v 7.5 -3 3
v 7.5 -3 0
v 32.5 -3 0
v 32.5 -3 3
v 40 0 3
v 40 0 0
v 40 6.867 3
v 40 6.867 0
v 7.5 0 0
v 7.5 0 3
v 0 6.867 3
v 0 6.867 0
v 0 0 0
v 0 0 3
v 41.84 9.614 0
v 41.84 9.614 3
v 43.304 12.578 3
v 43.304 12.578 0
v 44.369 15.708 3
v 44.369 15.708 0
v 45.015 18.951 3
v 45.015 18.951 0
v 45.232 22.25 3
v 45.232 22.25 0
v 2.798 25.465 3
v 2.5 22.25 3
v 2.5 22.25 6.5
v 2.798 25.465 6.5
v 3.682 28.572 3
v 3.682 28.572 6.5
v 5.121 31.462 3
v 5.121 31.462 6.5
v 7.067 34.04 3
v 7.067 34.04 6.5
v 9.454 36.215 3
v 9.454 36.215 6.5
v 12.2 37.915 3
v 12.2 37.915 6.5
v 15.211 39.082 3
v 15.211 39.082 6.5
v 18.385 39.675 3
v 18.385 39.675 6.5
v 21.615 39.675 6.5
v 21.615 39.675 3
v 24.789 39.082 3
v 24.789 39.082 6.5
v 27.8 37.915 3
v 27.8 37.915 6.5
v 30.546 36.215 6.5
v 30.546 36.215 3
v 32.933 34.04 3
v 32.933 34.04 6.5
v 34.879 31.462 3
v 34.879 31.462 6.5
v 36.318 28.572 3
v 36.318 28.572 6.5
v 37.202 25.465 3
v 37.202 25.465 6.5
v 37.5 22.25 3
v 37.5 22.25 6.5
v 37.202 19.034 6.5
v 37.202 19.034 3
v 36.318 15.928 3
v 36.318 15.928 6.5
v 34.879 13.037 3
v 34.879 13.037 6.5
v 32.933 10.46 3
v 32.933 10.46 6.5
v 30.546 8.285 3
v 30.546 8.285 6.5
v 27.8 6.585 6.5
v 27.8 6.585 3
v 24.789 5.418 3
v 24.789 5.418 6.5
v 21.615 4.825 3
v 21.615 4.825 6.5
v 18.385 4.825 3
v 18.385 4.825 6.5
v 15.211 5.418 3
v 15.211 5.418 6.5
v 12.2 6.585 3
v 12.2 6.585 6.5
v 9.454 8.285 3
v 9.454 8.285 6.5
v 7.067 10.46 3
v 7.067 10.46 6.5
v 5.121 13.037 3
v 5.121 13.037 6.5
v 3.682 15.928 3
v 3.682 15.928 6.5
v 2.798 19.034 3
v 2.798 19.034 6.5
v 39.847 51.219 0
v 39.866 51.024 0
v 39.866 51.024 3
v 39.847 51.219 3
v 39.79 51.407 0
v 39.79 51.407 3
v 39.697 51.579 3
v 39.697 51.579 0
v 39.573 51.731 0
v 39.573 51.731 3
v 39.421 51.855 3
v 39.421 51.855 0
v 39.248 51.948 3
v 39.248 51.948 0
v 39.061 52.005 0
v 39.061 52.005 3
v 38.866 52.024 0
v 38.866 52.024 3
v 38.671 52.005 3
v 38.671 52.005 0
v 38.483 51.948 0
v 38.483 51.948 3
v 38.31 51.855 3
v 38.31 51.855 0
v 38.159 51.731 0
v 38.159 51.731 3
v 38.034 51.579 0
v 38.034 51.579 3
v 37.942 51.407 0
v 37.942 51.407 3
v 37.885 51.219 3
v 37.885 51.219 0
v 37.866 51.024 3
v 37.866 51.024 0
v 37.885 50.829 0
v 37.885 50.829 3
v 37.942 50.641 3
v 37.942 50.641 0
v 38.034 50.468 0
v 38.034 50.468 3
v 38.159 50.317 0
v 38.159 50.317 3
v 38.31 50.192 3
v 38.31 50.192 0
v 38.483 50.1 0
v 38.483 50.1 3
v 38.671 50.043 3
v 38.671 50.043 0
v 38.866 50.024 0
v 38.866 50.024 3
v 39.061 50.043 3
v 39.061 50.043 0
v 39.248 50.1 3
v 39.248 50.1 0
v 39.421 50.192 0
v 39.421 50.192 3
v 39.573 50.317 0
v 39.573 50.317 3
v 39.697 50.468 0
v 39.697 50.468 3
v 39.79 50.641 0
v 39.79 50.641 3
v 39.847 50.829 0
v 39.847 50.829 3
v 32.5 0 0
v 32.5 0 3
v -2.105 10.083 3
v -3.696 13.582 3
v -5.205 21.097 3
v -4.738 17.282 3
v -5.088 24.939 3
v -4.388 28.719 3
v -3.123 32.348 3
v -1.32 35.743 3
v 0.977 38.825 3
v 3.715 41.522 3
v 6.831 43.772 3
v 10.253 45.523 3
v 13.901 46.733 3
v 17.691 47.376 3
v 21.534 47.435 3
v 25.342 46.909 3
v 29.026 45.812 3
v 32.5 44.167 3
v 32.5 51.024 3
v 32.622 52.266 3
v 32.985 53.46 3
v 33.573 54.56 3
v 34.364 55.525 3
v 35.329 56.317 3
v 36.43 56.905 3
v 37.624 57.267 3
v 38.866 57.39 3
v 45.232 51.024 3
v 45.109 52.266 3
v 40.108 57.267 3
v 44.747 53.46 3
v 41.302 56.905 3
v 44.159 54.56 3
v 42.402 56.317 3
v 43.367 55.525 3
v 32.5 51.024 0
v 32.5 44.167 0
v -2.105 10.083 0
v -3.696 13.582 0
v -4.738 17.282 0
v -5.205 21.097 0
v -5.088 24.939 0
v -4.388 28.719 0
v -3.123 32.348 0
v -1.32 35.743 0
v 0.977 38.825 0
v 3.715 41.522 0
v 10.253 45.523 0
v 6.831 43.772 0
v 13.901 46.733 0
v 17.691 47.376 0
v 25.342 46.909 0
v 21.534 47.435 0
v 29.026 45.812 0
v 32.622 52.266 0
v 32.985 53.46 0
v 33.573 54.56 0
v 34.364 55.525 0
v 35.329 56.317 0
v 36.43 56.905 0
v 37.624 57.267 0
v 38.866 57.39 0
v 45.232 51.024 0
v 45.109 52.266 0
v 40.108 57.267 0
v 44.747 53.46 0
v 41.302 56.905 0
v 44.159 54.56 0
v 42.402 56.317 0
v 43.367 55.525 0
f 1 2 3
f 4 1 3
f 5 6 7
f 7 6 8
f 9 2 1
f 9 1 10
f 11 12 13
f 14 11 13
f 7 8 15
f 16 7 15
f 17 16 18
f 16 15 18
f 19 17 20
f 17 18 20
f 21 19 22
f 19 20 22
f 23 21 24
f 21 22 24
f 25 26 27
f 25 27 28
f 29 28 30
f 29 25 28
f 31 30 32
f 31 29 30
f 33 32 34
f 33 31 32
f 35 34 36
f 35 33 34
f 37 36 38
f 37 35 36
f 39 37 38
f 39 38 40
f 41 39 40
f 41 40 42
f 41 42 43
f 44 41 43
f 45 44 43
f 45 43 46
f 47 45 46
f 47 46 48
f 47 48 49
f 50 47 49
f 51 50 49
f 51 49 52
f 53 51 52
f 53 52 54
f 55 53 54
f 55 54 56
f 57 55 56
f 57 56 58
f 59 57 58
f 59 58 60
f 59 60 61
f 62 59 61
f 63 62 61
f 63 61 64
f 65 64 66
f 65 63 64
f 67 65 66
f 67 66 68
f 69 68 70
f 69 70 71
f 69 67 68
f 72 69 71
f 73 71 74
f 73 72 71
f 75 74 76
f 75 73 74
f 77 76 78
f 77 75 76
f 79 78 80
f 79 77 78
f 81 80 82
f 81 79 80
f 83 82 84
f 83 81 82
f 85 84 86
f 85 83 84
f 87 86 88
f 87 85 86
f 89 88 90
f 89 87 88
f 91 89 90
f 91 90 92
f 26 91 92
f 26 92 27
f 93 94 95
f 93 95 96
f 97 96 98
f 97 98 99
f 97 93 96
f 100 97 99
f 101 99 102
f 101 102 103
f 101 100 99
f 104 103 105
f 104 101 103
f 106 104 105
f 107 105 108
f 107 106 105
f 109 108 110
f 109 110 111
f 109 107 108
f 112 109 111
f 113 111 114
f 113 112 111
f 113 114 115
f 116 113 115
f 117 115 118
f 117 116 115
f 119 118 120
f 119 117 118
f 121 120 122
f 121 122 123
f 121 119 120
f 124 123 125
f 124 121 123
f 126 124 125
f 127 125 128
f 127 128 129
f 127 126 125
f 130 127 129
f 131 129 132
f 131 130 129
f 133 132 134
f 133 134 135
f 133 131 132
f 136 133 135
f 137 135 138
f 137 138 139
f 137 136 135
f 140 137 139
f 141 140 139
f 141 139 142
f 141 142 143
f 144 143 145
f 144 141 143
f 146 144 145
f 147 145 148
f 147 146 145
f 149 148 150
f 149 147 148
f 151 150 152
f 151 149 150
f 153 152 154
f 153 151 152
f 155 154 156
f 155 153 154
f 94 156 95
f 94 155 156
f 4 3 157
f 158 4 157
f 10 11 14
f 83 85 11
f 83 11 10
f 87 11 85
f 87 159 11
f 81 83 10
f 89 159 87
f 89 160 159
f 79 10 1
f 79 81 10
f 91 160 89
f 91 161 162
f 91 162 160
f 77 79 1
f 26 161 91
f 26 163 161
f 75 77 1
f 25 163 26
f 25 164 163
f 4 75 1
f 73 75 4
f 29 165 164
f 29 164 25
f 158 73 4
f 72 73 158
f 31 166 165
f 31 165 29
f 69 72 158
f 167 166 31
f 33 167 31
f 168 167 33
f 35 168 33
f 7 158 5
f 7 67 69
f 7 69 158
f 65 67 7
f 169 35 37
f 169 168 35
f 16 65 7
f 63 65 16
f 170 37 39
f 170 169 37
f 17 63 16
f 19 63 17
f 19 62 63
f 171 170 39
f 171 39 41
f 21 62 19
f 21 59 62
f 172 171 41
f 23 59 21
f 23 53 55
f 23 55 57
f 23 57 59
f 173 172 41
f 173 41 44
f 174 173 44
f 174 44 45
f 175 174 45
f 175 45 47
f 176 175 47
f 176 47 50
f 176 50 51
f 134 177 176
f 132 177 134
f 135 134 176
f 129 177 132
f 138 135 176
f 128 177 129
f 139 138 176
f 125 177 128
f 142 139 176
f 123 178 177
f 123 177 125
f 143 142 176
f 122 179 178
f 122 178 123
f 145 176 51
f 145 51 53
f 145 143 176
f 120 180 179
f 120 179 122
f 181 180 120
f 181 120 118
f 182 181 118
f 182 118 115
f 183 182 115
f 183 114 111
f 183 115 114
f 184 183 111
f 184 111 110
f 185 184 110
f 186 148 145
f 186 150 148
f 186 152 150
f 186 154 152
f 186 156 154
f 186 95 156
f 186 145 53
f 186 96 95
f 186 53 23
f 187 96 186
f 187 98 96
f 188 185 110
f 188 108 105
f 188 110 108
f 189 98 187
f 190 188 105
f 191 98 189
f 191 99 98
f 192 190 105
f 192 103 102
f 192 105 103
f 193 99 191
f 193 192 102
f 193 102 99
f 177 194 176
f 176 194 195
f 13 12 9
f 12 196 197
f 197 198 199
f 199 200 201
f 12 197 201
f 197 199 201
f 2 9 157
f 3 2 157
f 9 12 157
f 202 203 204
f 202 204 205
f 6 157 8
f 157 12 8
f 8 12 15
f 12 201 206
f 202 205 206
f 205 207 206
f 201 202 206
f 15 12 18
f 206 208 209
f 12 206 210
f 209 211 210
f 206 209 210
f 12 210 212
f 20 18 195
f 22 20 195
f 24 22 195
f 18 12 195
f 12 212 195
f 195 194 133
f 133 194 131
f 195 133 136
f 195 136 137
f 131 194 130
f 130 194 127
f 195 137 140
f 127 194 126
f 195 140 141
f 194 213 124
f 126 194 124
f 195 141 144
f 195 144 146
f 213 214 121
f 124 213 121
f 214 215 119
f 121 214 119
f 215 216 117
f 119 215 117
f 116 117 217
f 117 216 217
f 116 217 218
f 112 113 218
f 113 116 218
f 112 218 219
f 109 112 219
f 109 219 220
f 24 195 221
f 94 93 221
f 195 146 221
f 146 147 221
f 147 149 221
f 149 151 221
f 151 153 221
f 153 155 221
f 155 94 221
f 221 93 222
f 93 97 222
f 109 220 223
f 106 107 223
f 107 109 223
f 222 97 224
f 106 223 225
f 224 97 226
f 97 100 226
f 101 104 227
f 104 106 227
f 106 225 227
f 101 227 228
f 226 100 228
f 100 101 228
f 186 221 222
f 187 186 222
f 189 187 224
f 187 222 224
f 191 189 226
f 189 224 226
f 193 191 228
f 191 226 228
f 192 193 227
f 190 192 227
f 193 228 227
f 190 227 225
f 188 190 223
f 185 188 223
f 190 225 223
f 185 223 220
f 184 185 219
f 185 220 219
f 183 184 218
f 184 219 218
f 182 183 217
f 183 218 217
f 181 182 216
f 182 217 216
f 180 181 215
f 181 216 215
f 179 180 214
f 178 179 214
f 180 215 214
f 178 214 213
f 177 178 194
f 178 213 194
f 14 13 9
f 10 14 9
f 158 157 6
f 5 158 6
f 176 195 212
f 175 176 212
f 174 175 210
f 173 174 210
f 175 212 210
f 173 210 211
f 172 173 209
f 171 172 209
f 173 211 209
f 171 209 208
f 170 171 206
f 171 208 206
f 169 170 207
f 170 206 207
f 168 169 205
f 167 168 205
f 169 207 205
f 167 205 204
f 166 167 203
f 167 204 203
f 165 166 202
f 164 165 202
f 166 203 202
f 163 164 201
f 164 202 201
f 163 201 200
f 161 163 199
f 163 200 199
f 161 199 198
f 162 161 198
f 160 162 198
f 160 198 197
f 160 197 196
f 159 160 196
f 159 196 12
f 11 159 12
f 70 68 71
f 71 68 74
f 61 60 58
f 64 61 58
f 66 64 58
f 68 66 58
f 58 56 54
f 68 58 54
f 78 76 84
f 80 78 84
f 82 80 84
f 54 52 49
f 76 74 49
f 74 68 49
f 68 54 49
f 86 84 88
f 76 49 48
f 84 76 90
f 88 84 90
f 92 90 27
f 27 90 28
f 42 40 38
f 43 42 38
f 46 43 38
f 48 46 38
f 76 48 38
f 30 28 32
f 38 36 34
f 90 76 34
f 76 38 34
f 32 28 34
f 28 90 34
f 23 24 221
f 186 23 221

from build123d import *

# Parameters (mm, degrees)
SKETCH1_R           = 17.265633628
SKETCH1_R_2         = 1
SKETCH1_R_3         = 10
SKETCH1_W           = 25
SKETCH1_H           = 3
BOSS_EXTRUDE5_DEPTH = 3
SKETCH2_R           = 17.5
BOSS_EXTRUDE6_DEPTH = 6.5


with BuildPart() as part:
    # Sketch1 → Boss-Extrude5 (new body)
    # profile 1 of 3: a face of its own
    with BuildSketch(Plane.XY):
        with BuildLine():
            Line((0, 0), (7.5, 0))
            Line((7.5, 0), (32.5, 0))
            Line((32.5, 0), (40, 0))
            Line((40, 0), (40, 6.867081787))
            ThreePointArc((40, 6.867081787), (43.887871625, 14.125845764), (45.231531638, 22.249870507))
            Line((45.231531638, 22.249870507), (45.231531638, 51.023857348))
            ThreePointArc((45.231531638, 51.023857348), (38.865765819, 57.389623167), (32.5, 51.023857348))
            Line((32.5, 51.023857348), (32.5, 44.167447672))
            ThreePointArc((32.5, 44.167447672), (0.97654543, 38.82510399), (0, 6.867081787))
            Line((0, 6.867081787), (0, 0))
        make_face()
        with Locations((20, 22.249870507)):
            Circle(SKETCH1_R, mode=Mode.SUBTRACT)
        with Locations((38.865765819, 51.023857348)):
            Circle(SKETCH1_R_2, mode=Mode.SUBTRACT)
    # profile 2 of 3: a face of its own
    with BuildSketch(Plane.XY):
        with Locations((20, 22.249870507)):
            Circle(SKETCH1_R)
        with Locations((20, 22.249870507)):
            Circle(SKETCH1_R_3, mode=Mode.SUBTRACT)
    # profile 3 of 3: a face of its own
    with BuildSketch(Plane.XY):
        with Locations((20, -1.5)):
            Rectangle(SKETCH1_W, SKETCH1_H)
    extrude(amount=BOSS_EXTRUDE5_DEPTH)

    # Sketch2 → Boss-Extrude6 (add)
    with BuildSketch(Plane(origin=(0, 0, 0), x_dir=(-1, 0, 0), z_dir=(0, 0, -1))):
        with Locations((-20, 22.249870507)):
            Circle(SKETCH2_R)
    extrude(amount=-BOSS_EXTRUDE6_DEPTH)


solid = part.part
